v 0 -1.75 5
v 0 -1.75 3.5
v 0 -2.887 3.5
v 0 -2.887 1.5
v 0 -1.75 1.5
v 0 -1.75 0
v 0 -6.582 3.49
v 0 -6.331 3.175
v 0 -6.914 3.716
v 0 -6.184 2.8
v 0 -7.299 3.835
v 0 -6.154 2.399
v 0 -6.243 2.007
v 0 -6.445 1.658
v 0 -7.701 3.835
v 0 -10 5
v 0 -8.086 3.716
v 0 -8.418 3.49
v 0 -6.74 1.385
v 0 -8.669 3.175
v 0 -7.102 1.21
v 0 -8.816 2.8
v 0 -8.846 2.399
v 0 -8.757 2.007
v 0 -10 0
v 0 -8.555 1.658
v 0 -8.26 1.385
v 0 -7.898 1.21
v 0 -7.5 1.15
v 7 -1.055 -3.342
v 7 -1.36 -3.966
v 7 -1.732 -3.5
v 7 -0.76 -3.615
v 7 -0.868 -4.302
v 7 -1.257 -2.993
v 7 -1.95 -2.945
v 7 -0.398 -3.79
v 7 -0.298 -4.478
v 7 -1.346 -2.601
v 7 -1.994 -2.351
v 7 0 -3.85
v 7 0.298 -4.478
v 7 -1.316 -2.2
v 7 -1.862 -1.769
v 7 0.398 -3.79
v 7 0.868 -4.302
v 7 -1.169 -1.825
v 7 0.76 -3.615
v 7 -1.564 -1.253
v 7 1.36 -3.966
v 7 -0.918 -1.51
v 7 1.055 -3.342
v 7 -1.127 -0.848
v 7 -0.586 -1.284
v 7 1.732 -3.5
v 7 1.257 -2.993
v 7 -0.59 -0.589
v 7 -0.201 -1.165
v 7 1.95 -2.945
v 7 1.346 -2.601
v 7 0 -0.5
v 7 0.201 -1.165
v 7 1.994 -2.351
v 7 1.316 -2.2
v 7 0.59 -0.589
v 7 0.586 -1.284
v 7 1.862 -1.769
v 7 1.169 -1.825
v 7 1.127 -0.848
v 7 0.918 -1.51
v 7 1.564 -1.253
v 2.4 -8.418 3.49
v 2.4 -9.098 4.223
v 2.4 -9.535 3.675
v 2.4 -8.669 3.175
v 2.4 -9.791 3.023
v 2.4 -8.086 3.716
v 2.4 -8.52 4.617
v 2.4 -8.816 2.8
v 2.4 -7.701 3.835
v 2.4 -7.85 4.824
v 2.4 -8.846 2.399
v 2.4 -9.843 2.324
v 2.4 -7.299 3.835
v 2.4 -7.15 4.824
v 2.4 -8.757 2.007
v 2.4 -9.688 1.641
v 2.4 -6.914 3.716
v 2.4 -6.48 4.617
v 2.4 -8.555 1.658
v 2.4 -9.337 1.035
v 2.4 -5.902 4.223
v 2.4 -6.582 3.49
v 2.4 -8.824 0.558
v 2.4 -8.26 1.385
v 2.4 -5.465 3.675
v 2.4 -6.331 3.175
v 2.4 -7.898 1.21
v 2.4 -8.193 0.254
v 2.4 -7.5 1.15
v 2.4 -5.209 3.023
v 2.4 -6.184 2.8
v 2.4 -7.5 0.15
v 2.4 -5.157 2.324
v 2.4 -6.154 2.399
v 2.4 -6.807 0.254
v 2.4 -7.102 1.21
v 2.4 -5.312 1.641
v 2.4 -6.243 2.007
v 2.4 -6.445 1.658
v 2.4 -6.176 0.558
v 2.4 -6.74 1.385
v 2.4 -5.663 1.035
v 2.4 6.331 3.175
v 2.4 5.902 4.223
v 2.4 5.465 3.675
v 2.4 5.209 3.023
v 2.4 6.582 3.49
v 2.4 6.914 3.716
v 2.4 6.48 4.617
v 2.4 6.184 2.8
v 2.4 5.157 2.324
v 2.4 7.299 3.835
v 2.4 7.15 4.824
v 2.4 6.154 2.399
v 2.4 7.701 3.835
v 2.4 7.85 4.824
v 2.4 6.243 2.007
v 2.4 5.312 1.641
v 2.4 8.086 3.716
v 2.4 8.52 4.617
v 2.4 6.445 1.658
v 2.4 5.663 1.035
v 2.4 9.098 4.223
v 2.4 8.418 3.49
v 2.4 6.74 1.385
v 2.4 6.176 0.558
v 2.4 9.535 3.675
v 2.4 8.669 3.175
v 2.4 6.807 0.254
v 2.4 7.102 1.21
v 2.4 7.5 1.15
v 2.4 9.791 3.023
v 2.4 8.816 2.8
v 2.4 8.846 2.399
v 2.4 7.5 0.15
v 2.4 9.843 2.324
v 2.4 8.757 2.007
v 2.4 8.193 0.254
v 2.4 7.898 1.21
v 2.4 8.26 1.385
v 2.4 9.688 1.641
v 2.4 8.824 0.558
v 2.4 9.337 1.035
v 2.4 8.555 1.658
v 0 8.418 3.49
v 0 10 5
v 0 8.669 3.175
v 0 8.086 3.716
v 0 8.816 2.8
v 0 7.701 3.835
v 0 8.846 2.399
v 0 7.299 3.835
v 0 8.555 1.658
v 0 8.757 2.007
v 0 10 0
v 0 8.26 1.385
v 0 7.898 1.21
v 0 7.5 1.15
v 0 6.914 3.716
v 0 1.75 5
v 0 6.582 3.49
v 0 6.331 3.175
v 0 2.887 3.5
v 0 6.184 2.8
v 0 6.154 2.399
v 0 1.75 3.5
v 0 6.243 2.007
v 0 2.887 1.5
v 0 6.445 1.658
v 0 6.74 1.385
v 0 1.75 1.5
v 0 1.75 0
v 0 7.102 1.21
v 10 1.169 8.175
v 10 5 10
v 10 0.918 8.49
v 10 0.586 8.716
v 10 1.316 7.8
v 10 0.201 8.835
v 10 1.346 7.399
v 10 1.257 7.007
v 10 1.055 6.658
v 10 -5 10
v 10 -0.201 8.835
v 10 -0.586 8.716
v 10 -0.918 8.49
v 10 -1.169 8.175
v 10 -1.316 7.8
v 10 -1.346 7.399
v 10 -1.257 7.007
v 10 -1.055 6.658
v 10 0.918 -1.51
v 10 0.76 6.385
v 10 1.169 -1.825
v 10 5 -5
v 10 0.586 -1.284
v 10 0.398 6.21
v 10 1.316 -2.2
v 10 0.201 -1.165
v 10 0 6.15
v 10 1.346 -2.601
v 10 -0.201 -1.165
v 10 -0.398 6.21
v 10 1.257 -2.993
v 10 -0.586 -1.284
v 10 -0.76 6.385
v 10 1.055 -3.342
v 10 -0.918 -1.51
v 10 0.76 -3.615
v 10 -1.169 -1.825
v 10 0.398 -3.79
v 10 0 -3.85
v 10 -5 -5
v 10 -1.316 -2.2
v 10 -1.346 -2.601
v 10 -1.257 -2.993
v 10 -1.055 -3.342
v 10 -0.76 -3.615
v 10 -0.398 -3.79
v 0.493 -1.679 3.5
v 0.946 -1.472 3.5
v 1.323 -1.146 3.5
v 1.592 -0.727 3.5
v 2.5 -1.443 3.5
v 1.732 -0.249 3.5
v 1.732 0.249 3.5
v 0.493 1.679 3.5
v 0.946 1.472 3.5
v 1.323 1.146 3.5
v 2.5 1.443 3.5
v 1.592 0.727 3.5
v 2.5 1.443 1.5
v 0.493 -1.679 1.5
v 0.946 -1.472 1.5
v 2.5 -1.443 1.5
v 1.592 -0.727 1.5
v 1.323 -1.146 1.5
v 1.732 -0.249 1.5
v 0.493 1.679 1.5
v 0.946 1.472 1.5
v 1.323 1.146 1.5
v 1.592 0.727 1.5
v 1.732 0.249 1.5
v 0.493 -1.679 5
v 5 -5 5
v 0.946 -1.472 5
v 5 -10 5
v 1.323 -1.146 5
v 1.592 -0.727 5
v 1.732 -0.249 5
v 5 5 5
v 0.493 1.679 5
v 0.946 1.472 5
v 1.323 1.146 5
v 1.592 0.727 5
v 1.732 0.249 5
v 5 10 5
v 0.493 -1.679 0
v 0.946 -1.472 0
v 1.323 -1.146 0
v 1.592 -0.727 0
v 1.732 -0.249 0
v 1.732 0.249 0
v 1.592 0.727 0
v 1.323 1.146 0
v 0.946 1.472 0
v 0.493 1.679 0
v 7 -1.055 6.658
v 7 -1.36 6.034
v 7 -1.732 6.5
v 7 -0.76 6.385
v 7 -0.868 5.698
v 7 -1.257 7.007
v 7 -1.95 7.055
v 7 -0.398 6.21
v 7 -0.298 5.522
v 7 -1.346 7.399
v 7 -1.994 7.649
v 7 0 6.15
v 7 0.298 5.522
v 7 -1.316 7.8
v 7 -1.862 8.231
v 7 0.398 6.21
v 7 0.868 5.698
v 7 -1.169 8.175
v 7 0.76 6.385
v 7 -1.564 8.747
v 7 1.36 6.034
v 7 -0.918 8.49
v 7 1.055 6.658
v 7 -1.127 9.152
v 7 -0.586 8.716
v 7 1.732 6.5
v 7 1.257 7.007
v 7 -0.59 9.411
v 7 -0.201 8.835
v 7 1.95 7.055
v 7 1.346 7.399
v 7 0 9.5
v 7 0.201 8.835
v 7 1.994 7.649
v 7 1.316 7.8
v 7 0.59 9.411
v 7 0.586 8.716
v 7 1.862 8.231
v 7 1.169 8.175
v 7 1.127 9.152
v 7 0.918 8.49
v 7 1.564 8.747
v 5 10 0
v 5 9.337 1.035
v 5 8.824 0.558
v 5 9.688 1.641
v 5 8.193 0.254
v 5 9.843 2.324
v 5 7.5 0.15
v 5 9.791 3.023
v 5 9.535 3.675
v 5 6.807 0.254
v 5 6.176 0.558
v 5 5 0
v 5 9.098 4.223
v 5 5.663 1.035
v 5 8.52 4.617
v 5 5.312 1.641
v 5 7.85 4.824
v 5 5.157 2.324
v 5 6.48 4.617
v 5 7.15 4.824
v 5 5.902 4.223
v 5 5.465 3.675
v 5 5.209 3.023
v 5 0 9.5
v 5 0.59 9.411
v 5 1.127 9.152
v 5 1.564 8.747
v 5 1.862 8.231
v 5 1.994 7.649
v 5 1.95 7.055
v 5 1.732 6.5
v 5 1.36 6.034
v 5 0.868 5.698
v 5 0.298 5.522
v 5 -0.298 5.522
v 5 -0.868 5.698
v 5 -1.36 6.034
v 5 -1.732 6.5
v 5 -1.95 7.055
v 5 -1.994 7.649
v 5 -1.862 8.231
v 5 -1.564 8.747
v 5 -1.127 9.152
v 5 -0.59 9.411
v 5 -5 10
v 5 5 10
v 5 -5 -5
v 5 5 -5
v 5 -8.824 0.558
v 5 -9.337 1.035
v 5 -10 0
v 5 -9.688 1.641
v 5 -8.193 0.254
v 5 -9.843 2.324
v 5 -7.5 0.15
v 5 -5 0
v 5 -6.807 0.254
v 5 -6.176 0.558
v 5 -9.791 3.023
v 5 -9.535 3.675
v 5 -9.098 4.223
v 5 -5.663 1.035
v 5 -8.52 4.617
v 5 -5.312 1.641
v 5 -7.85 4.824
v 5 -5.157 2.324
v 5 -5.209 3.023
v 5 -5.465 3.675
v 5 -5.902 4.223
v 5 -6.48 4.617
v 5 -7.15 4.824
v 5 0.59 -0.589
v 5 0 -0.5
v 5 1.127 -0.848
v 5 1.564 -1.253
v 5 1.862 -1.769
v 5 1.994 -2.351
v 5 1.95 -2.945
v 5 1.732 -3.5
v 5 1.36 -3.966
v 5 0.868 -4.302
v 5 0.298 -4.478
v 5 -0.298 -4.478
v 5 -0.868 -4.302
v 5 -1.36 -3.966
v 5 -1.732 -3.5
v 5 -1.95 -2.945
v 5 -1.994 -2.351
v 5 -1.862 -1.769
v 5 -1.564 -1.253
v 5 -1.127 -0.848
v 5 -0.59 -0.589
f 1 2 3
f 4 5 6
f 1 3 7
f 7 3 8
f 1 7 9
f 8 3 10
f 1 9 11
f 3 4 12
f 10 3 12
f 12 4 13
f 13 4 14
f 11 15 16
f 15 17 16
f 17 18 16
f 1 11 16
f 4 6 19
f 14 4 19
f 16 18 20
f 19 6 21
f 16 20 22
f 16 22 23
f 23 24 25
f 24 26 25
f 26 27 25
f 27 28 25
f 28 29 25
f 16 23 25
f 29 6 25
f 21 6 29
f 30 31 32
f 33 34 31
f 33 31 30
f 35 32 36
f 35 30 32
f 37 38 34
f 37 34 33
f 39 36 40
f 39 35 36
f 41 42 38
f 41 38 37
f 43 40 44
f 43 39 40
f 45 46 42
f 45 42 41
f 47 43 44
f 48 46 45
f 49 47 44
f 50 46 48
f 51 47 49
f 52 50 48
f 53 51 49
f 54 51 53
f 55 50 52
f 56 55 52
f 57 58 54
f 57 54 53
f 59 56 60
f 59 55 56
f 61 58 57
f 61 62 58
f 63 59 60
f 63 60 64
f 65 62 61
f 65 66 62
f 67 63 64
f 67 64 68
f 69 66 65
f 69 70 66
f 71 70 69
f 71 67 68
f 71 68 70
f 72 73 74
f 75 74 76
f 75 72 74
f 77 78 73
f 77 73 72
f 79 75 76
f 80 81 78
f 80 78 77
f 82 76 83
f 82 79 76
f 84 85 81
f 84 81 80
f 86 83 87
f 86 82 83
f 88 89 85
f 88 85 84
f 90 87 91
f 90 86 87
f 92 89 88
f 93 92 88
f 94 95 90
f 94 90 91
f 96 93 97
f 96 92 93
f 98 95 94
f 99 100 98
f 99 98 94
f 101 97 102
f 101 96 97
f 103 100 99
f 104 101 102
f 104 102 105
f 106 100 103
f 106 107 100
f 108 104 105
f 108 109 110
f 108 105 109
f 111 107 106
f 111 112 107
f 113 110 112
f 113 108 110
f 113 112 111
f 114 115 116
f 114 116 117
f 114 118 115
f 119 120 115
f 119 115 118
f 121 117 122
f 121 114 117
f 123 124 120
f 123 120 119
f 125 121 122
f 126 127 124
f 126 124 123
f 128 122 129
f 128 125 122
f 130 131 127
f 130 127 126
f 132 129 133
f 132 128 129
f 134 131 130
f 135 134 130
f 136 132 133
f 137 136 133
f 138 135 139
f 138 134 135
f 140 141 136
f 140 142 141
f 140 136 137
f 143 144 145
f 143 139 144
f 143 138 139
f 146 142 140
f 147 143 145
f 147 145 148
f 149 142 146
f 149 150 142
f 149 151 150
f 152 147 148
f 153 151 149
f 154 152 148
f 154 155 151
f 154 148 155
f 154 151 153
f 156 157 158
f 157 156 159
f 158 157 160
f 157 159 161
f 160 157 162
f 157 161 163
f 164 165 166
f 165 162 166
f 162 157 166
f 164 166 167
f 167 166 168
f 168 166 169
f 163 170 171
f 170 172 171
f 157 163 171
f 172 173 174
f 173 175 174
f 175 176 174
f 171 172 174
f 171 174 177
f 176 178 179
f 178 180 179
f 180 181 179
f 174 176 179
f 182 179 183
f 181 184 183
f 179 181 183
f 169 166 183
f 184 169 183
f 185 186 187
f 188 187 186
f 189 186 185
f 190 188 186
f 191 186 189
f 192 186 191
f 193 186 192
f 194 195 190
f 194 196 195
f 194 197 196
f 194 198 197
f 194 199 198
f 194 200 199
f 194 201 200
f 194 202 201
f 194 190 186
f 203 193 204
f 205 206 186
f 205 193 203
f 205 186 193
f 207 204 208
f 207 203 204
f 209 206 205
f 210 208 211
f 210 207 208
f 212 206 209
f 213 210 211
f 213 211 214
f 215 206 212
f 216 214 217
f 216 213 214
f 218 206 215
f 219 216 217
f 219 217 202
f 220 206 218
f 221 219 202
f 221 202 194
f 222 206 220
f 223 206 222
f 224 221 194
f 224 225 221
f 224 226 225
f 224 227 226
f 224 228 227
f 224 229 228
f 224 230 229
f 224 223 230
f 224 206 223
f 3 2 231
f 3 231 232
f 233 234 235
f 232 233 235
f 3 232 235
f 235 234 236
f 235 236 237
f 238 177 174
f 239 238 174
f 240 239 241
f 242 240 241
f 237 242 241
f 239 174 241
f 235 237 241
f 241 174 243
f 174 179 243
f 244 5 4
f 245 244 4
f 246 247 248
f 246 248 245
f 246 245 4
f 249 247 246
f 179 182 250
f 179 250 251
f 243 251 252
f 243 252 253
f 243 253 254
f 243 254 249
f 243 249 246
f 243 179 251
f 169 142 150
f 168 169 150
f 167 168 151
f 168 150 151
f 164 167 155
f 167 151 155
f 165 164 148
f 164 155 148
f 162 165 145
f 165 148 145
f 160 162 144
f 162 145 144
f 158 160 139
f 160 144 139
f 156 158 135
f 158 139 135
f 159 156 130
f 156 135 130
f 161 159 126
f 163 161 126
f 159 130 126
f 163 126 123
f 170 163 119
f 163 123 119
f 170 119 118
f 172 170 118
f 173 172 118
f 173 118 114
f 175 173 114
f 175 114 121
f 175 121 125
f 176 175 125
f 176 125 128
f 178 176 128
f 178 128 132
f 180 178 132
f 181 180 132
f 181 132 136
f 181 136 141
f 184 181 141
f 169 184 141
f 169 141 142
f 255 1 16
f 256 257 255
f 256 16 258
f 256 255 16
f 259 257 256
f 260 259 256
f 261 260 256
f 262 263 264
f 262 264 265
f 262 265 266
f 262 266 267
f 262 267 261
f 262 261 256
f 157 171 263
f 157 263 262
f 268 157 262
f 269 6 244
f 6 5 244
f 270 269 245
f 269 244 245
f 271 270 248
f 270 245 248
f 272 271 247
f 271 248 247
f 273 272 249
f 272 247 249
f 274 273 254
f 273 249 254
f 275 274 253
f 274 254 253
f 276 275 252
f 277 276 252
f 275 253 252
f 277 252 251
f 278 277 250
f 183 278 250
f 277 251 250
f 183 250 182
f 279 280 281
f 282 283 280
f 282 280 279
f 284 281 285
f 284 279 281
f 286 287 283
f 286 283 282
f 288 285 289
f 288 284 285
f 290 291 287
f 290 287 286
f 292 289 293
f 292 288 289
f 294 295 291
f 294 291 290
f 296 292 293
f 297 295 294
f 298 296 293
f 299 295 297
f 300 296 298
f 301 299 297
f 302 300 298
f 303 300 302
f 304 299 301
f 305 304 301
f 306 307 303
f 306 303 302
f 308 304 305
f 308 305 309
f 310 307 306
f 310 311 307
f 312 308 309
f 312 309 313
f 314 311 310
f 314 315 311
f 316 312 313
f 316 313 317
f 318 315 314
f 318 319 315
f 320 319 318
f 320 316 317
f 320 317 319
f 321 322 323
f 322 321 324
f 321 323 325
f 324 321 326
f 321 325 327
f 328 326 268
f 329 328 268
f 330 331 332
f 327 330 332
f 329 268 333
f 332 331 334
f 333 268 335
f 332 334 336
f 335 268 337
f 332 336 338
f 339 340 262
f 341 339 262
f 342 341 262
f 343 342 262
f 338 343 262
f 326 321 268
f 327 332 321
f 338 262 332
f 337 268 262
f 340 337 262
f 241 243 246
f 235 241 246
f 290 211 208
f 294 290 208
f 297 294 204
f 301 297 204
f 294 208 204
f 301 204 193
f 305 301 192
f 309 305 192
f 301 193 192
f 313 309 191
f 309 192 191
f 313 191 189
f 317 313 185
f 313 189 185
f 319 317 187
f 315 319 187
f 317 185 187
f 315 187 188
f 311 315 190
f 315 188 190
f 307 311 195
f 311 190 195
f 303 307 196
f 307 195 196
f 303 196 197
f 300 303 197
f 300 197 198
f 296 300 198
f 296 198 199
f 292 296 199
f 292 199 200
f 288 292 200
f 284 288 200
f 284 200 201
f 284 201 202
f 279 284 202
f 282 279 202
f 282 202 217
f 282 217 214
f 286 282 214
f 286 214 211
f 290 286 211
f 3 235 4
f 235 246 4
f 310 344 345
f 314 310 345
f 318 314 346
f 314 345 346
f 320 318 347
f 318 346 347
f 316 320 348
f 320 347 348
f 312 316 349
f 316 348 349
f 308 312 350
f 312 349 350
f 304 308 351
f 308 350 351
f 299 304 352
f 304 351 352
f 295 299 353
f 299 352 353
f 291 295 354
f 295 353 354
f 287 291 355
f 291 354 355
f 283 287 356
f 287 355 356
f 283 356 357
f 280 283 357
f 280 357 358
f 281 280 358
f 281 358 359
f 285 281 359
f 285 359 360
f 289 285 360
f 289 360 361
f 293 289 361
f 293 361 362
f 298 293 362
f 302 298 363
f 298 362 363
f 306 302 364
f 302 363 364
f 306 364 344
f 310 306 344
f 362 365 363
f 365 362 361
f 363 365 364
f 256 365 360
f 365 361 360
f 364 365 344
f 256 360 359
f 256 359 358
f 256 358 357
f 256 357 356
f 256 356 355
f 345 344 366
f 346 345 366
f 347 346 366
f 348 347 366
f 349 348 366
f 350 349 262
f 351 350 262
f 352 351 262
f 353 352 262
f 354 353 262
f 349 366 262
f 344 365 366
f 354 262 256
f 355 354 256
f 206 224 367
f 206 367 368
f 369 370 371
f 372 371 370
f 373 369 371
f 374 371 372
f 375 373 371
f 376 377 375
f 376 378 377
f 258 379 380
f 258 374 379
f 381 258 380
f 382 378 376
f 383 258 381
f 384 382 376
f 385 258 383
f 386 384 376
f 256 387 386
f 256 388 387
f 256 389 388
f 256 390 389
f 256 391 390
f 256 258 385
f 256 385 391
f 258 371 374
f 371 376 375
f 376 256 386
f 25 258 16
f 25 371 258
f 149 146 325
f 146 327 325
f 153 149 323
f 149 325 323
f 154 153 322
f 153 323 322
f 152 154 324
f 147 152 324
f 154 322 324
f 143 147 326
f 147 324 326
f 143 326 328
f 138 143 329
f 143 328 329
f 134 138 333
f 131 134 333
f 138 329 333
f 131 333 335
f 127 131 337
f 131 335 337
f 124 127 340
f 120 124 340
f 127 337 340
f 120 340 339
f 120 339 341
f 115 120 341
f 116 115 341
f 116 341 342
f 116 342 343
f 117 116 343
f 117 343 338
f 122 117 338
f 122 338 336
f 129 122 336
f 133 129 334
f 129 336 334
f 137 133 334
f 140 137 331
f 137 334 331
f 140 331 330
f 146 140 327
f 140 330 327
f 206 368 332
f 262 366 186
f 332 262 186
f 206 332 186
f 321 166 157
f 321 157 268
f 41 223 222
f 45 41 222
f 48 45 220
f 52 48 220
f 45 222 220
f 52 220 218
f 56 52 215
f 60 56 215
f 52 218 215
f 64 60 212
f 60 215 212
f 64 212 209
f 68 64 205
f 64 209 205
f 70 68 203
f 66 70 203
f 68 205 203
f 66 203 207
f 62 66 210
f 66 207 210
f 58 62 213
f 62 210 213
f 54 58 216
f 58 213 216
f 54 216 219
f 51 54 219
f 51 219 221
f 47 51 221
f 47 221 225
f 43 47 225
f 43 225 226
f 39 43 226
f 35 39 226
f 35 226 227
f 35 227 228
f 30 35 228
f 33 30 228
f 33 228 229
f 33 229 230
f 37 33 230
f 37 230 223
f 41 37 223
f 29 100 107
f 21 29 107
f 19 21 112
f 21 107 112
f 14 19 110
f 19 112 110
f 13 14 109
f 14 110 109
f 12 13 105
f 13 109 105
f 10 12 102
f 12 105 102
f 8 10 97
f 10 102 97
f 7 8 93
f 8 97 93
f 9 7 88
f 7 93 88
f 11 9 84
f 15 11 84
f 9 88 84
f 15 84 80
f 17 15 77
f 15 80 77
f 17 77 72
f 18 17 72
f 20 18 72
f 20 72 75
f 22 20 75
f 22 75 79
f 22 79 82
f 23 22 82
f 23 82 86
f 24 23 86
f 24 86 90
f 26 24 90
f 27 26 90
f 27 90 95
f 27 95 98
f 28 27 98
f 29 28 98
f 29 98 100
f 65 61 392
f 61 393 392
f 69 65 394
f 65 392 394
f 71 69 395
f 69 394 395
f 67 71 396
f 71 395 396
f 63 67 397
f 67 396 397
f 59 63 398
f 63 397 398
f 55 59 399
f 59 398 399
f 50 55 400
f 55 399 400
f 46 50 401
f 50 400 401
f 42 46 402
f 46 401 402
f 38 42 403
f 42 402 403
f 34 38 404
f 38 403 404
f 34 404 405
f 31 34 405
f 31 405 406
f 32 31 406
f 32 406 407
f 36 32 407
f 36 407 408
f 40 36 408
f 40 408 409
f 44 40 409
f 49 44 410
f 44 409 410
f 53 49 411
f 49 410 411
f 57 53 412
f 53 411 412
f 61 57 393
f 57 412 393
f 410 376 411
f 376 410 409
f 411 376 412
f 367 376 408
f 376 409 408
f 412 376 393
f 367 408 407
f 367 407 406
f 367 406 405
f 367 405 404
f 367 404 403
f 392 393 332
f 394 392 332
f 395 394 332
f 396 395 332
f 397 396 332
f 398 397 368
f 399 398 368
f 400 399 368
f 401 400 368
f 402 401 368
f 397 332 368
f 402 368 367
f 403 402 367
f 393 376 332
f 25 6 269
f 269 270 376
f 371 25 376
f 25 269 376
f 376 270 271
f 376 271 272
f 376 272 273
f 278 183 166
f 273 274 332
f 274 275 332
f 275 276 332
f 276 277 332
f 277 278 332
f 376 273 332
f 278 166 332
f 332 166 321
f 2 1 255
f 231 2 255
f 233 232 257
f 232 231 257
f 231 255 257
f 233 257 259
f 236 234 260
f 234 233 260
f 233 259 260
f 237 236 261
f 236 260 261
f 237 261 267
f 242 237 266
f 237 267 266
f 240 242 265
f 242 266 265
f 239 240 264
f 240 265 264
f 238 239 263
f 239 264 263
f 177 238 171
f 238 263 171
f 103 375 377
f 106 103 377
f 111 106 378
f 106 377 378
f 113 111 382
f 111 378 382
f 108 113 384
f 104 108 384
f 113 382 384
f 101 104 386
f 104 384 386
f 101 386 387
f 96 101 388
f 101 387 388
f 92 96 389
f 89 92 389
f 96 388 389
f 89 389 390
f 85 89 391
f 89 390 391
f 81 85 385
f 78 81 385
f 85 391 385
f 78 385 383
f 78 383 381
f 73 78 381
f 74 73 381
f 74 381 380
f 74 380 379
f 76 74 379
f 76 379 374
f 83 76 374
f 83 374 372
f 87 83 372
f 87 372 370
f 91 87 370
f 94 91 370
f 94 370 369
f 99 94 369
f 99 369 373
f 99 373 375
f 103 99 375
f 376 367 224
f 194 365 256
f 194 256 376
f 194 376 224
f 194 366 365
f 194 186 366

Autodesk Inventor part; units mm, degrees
ref_plane "YZ Plane" through (0, 0, 0) normal (1, 0, 0) x (0, 1, 0)
ref_plane "XZ Plane" through (0, 0, 0) normal (0, 1, 0) x (-1, 0, 0)
sketch "Sketch1" plane through (0, 0, 0) normal (0, 0, 1) x (1, 0, 0)
  line L0 (10, -10) -> (-10, -10)
  line L1 (-10, -10) -> (-10, 10)
  line L2 (-10, 10) -> (10, 10)
  line L3 (10, 10) -> (10, -10)
  line L4 (10, -10) -> (-10, 10) construction
  line L5 (-10, -10) -> (10, 10) construction
  line L6 (10, -10) -> (6, -10)
  line L7 (6, 10) -> (10, 10)
  line L8 (10, 10) -> (10, -10)
  line L9 (0, 10) -> (0, -10)
  line L10 (0, -10) -> (0, 10)
  point P0 (0, 0)
  dimension "d0" = 20
  dimension "d1" = 20
extrude "Extrusion1" add sketch "Sketch1" along normal blind 5 contours L0 L9 L2 L3
ref_plane "Work Plane1" through (0, 0, 2.5) normal (0, 0, 1) x (1, 0, 0)
sketch "Sketch2" plane through (0, 0, 2.5) normal (0, 0, 1) x (1, 0, 0)
  line L0 (0, 10) -> (0, -10) projected
  line L1 (0, 2.8868) -> (2.5, 1.4434)
  line L2 (2.5, 1.4434) -> (2.5, -1.4434)
  line L3 (2.5, -1.4434) -> (0, -2.8868)
  line L4 (0, -2.8868) -> (-2.5, -1.4434)
  line L5 (-2.5, -1.4434) -> (-2.5, 1.4434)
  line L6 (-2.5, 1.4434) -> (0, 2.8868)
  point P0 (0, 0)
  point P1 (0, 0)
  dimension "d12" = 5
extrude "Extrusion2" cut sketch "Sketch2" along normal mid plane 2
sketch "Sketch3" plane through (0, 0, 5) normal (0, 0, 1) x (1, 0, 0)
  circle A0 centre (0, 0) radius 1.75
  dimension "d15" = 3.5
extrude "Extrusion3" cut sketch "Sketch3" against normal blind 8
sketch "Sketch4" plane through (10, -10, 0) normal (1, 0, 0) x (0, 0, -1)
  circle A0 centre (-2.5, 17.5) radius 1.35
  circle A1 centre (-2.5, 2.5) radius 1.35
  line L0 (0, 20) -> (-5, 20) projected
  line L1 (0, 0) -> (-5, 0) projected
  line L2 (0, 0) -> (0, 20) projected
  point P0 (0, 10)
  dimension "d18" = 2.5
  dimension "d19" = 2.5
  dimension "d20" = 2.5
  dimension "d21" = 2.5
  dimension "d22" = 2.7
  dimension "d23" = 2.7
extrude "Extrusion4" cut sketch "Sketch4" against normal blind 25
sketch "Sketch5" plane through (10, -10, 0) normal (1, 0, 0) x (0, 0, -1)
  circle A0 centre (-2.5, 17.5) radius 1.35 projected
  circle A1 centre (-2.5, 17.5) radius 2
  circle A2 centre (-2.5, 2.5) radius 1.35 projected
  circle A3 centre (-2.5, 2.5) radius 2
  point P0 (0, 10)
  dimension "d26" = 4
  dimension "d27" = 4
extrude "Extrusion5" cut sketch "Sketch5" against normal blind 4 contours A0 | A1 | A2 | A3
sketch "Sketch6" plane through (0, 0, 5) normal (0, 0, 1) x (1, 0, 0)
  point P0 (0, 0)
sketch "Sketch7" plane through (0, 0, 5) normal (0, 0, 1) x (1, 0, 0)
  line L0 (10, -10) -> (10, 10) projected
  line L1 (10, 10) -> (5, 10)
  line L2 (5, 10) -> (5, 5)
  line L3 (5, 5) -> (10, 5)
  line L4 (10, 5) -> (10, 10)
  line L5 (0, -10) -> (10, -10) projected
  line L6 (10, -10) -> (5, -10)
  line L7 (5, -10) -> (5, -5)
  line L8 (5, -5) -> (10, -5)
  line L9 (10, -5) -> (10, -10)
  point P0 (0, 0)
  dimension "d30" = 5
  dimension "d31" = 5
  dimension "d32" = 5
  dimension "d33" = 5
extrude "Extrusion6" cut sketch "Sketch7" against normal blind 10
sketch "Sketch8" plane through (10, -5, 0) normal (1, 0, 0) x (0, 0, -1)
  line L0 (0, 0) -> (5, 0)
  line L1 (5, 0) -> (5, 10)
  line L2 (5, 10) -> (0, 10)
  line L3 (0, 10) -> (0, 0)
  line L4 (-5, 0) -> (-5, 10) projected
  line L5 (-5, 10) -> (-10, 10)
  line L6 (-10, 10) -> (-10, 0)
  line L7 (-10, 0) -> (-5, 0)
  line L8 (-5, 0) -> (-5, 10)
  circle A0 centre (-7.5, 5) radius 1.35
  circle A1 centre (2.5, 5) radius 1.35
  point P0 (0, 5)
  point P1 (-7.5, 0)
  dimension "d36" = 5
  dimension "d37" = 5
  dimension "d38" = 5
  dimension "d39" = 2.7
  dimension "d40" = 2.7
  dimension "d41" = 5
  dimension "d42" = 5
  dimension "d43" = 5
  dimension "d44" = 5
  dimension "d45" = 2.5
  dimension "d46" = 2.5
extrude "Extrusion7" add sketch "Sketch8" against normal blind 5
sketch "Sketch9" plane through (5, -5, 0) normal (-1, 0, 0) x (0, 0, 1)
  circle A0 centre (7.5, 5) radius 1.35 projected
  circle A1 centre (7.5, 5) radius 2
  circle A2 centre (-2.5, 5) radius 1.35 projected
  circle A3 centre (-2.5, 5) radius 2
  point P0 (0, 5)
  dimension "d49" = 4
  dimension "d50" = 4
extrude "Extrusion8" cut sketch "Sketch9" against normal blind 2 contours A0 | A1 | A2 | A3
sketch "Sketch10" plane through (5, 10, 5) normal (1, 0, 0) x (0, 0, -1)
  circle A0 centre (2.5, -2.5) radius 1.35 projected
  circle A1 centre (2.5, -2.5) radius 2.35
  circle A2 centre (2.5, -17.5) radius 1.35 projected
  circle A3 centre (2.5, -17.5) radius 2.35
  point P0 (5, -10)
  dimension "d53" = 4.7
  dimension "d54" = 4.7
extrude "Extrusion9" cut sketch "Sketch10" against normal blind 2.6
equation "\"d18\" = d19"
equation "\"d20\" = d19"
equation "\"d21\" = d19"
equation "\"d23\" = d22"
equation "\"d27\" = d26"
equation "\"d39\" = d40"
equation "\"d42\" = d41"
equation "\"d50\" = d49"
properties part number "POMSliderMotor" material "Acetal Resin, White"
